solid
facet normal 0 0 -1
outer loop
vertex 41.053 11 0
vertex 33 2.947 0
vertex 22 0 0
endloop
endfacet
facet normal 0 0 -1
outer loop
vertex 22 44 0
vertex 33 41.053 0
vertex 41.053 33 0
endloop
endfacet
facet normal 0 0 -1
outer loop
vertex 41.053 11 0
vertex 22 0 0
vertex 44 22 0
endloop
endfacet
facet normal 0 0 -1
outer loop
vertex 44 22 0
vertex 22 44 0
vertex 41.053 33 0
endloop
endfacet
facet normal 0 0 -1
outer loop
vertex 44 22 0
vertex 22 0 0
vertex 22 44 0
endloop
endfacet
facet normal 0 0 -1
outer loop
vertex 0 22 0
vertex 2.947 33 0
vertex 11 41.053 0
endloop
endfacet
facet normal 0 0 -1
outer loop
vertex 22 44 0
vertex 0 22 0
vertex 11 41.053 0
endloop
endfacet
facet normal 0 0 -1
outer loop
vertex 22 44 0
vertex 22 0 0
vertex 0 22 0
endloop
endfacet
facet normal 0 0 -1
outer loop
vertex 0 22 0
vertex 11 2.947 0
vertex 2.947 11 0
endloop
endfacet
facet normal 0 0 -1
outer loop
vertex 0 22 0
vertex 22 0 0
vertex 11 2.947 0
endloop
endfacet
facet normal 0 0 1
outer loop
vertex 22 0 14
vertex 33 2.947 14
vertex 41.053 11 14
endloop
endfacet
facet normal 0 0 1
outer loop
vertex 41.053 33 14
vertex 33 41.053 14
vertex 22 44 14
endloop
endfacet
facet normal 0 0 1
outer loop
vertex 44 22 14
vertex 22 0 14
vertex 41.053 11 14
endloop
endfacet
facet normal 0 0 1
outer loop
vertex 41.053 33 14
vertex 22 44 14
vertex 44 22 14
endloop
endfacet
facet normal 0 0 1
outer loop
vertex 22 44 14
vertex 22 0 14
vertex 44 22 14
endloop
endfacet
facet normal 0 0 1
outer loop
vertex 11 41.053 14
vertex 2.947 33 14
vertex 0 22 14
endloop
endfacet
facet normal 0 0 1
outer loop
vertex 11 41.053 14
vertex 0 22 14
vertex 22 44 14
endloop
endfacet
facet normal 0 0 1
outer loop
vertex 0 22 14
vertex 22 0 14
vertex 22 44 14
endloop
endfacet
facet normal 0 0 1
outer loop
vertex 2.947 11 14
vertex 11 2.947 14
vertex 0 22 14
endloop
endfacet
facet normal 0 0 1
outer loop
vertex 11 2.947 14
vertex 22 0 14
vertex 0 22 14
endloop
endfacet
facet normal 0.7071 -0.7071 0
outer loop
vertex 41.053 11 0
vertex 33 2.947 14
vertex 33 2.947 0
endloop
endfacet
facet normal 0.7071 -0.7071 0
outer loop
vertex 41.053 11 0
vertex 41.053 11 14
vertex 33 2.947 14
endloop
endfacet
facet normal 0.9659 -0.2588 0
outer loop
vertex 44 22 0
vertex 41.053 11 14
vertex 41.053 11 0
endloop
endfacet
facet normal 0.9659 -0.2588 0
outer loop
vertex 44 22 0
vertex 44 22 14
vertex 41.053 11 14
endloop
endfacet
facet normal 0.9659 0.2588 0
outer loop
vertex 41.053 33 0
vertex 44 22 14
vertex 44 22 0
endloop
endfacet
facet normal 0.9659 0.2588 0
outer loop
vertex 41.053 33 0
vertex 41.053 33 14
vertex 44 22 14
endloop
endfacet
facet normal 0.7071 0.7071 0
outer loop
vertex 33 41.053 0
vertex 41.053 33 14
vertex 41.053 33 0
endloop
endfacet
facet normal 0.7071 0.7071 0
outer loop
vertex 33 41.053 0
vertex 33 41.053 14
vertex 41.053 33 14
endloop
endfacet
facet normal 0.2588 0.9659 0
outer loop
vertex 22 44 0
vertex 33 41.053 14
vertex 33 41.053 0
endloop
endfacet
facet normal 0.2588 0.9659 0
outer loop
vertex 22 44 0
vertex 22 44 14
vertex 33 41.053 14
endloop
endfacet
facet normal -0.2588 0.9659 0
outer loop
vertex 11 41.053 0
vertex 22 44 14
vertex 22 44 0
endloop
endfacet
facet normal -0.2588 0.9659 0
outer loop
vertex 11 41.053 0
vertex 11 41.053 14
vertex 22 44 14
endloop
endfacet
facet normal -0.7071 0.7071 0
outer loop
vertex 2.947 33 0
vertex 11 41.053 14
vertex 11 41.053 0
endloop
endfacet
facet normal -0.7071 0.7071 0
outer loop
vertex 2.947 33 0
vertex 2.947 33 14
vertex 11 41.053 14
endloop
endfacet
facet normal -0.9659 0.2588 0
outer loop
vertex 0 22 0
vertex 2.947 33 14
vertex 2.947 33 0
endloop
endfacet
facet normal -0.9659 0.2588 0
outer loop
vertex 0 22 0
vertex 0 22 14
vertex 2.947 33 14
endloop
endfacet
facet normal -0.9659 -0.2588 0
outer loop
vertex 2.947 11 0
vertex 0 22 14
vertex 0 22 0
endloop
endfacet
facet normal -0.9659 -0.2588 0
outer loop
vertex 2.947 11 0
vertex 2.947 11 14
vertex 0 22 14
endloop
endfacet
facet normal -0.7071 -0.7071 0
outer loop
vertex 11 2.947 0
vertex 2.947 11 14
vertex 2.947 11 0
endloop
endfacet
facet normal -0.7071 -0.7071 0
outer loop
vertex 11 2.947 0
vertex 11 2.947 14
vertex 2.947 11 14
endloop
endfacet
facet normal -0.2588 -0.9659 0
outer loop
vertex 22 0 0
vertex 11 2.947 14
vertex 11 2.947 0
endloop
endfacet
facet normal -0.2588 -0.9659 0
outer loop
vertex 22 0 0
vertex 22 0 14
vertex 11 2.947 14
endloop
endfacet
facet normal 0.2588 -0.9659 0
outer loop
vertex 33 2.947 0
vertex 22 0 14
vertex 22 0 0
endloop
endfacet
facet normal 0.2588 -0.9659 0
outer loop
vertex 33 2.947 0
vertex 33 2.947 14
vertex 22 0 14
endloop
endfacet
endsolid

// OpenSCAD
$fn = 32;

// ----------------------------------------------------------------------
// Flat adaptor: keyed, 14 mm thick
// ----------------------------------------------------------------------

// --- parameters (mm) ---
profile_height = 14;      // extrusion height
profile_points = 12;      // points of the closed outline

profile = [[0, 22], [2.947, 11], [11, 2.947], [22, 0], [33, 2.947], [41.053, 11], [44, 22], [41.053, 33], [33, 41.053], [22, 44], [11, 41.053], [2.947, 33]];  // single closed polygon, 12 points, counter clockwise

// --- the one profile operation ---
linear_extrude(height = profile_height) polygon(points = profile);
